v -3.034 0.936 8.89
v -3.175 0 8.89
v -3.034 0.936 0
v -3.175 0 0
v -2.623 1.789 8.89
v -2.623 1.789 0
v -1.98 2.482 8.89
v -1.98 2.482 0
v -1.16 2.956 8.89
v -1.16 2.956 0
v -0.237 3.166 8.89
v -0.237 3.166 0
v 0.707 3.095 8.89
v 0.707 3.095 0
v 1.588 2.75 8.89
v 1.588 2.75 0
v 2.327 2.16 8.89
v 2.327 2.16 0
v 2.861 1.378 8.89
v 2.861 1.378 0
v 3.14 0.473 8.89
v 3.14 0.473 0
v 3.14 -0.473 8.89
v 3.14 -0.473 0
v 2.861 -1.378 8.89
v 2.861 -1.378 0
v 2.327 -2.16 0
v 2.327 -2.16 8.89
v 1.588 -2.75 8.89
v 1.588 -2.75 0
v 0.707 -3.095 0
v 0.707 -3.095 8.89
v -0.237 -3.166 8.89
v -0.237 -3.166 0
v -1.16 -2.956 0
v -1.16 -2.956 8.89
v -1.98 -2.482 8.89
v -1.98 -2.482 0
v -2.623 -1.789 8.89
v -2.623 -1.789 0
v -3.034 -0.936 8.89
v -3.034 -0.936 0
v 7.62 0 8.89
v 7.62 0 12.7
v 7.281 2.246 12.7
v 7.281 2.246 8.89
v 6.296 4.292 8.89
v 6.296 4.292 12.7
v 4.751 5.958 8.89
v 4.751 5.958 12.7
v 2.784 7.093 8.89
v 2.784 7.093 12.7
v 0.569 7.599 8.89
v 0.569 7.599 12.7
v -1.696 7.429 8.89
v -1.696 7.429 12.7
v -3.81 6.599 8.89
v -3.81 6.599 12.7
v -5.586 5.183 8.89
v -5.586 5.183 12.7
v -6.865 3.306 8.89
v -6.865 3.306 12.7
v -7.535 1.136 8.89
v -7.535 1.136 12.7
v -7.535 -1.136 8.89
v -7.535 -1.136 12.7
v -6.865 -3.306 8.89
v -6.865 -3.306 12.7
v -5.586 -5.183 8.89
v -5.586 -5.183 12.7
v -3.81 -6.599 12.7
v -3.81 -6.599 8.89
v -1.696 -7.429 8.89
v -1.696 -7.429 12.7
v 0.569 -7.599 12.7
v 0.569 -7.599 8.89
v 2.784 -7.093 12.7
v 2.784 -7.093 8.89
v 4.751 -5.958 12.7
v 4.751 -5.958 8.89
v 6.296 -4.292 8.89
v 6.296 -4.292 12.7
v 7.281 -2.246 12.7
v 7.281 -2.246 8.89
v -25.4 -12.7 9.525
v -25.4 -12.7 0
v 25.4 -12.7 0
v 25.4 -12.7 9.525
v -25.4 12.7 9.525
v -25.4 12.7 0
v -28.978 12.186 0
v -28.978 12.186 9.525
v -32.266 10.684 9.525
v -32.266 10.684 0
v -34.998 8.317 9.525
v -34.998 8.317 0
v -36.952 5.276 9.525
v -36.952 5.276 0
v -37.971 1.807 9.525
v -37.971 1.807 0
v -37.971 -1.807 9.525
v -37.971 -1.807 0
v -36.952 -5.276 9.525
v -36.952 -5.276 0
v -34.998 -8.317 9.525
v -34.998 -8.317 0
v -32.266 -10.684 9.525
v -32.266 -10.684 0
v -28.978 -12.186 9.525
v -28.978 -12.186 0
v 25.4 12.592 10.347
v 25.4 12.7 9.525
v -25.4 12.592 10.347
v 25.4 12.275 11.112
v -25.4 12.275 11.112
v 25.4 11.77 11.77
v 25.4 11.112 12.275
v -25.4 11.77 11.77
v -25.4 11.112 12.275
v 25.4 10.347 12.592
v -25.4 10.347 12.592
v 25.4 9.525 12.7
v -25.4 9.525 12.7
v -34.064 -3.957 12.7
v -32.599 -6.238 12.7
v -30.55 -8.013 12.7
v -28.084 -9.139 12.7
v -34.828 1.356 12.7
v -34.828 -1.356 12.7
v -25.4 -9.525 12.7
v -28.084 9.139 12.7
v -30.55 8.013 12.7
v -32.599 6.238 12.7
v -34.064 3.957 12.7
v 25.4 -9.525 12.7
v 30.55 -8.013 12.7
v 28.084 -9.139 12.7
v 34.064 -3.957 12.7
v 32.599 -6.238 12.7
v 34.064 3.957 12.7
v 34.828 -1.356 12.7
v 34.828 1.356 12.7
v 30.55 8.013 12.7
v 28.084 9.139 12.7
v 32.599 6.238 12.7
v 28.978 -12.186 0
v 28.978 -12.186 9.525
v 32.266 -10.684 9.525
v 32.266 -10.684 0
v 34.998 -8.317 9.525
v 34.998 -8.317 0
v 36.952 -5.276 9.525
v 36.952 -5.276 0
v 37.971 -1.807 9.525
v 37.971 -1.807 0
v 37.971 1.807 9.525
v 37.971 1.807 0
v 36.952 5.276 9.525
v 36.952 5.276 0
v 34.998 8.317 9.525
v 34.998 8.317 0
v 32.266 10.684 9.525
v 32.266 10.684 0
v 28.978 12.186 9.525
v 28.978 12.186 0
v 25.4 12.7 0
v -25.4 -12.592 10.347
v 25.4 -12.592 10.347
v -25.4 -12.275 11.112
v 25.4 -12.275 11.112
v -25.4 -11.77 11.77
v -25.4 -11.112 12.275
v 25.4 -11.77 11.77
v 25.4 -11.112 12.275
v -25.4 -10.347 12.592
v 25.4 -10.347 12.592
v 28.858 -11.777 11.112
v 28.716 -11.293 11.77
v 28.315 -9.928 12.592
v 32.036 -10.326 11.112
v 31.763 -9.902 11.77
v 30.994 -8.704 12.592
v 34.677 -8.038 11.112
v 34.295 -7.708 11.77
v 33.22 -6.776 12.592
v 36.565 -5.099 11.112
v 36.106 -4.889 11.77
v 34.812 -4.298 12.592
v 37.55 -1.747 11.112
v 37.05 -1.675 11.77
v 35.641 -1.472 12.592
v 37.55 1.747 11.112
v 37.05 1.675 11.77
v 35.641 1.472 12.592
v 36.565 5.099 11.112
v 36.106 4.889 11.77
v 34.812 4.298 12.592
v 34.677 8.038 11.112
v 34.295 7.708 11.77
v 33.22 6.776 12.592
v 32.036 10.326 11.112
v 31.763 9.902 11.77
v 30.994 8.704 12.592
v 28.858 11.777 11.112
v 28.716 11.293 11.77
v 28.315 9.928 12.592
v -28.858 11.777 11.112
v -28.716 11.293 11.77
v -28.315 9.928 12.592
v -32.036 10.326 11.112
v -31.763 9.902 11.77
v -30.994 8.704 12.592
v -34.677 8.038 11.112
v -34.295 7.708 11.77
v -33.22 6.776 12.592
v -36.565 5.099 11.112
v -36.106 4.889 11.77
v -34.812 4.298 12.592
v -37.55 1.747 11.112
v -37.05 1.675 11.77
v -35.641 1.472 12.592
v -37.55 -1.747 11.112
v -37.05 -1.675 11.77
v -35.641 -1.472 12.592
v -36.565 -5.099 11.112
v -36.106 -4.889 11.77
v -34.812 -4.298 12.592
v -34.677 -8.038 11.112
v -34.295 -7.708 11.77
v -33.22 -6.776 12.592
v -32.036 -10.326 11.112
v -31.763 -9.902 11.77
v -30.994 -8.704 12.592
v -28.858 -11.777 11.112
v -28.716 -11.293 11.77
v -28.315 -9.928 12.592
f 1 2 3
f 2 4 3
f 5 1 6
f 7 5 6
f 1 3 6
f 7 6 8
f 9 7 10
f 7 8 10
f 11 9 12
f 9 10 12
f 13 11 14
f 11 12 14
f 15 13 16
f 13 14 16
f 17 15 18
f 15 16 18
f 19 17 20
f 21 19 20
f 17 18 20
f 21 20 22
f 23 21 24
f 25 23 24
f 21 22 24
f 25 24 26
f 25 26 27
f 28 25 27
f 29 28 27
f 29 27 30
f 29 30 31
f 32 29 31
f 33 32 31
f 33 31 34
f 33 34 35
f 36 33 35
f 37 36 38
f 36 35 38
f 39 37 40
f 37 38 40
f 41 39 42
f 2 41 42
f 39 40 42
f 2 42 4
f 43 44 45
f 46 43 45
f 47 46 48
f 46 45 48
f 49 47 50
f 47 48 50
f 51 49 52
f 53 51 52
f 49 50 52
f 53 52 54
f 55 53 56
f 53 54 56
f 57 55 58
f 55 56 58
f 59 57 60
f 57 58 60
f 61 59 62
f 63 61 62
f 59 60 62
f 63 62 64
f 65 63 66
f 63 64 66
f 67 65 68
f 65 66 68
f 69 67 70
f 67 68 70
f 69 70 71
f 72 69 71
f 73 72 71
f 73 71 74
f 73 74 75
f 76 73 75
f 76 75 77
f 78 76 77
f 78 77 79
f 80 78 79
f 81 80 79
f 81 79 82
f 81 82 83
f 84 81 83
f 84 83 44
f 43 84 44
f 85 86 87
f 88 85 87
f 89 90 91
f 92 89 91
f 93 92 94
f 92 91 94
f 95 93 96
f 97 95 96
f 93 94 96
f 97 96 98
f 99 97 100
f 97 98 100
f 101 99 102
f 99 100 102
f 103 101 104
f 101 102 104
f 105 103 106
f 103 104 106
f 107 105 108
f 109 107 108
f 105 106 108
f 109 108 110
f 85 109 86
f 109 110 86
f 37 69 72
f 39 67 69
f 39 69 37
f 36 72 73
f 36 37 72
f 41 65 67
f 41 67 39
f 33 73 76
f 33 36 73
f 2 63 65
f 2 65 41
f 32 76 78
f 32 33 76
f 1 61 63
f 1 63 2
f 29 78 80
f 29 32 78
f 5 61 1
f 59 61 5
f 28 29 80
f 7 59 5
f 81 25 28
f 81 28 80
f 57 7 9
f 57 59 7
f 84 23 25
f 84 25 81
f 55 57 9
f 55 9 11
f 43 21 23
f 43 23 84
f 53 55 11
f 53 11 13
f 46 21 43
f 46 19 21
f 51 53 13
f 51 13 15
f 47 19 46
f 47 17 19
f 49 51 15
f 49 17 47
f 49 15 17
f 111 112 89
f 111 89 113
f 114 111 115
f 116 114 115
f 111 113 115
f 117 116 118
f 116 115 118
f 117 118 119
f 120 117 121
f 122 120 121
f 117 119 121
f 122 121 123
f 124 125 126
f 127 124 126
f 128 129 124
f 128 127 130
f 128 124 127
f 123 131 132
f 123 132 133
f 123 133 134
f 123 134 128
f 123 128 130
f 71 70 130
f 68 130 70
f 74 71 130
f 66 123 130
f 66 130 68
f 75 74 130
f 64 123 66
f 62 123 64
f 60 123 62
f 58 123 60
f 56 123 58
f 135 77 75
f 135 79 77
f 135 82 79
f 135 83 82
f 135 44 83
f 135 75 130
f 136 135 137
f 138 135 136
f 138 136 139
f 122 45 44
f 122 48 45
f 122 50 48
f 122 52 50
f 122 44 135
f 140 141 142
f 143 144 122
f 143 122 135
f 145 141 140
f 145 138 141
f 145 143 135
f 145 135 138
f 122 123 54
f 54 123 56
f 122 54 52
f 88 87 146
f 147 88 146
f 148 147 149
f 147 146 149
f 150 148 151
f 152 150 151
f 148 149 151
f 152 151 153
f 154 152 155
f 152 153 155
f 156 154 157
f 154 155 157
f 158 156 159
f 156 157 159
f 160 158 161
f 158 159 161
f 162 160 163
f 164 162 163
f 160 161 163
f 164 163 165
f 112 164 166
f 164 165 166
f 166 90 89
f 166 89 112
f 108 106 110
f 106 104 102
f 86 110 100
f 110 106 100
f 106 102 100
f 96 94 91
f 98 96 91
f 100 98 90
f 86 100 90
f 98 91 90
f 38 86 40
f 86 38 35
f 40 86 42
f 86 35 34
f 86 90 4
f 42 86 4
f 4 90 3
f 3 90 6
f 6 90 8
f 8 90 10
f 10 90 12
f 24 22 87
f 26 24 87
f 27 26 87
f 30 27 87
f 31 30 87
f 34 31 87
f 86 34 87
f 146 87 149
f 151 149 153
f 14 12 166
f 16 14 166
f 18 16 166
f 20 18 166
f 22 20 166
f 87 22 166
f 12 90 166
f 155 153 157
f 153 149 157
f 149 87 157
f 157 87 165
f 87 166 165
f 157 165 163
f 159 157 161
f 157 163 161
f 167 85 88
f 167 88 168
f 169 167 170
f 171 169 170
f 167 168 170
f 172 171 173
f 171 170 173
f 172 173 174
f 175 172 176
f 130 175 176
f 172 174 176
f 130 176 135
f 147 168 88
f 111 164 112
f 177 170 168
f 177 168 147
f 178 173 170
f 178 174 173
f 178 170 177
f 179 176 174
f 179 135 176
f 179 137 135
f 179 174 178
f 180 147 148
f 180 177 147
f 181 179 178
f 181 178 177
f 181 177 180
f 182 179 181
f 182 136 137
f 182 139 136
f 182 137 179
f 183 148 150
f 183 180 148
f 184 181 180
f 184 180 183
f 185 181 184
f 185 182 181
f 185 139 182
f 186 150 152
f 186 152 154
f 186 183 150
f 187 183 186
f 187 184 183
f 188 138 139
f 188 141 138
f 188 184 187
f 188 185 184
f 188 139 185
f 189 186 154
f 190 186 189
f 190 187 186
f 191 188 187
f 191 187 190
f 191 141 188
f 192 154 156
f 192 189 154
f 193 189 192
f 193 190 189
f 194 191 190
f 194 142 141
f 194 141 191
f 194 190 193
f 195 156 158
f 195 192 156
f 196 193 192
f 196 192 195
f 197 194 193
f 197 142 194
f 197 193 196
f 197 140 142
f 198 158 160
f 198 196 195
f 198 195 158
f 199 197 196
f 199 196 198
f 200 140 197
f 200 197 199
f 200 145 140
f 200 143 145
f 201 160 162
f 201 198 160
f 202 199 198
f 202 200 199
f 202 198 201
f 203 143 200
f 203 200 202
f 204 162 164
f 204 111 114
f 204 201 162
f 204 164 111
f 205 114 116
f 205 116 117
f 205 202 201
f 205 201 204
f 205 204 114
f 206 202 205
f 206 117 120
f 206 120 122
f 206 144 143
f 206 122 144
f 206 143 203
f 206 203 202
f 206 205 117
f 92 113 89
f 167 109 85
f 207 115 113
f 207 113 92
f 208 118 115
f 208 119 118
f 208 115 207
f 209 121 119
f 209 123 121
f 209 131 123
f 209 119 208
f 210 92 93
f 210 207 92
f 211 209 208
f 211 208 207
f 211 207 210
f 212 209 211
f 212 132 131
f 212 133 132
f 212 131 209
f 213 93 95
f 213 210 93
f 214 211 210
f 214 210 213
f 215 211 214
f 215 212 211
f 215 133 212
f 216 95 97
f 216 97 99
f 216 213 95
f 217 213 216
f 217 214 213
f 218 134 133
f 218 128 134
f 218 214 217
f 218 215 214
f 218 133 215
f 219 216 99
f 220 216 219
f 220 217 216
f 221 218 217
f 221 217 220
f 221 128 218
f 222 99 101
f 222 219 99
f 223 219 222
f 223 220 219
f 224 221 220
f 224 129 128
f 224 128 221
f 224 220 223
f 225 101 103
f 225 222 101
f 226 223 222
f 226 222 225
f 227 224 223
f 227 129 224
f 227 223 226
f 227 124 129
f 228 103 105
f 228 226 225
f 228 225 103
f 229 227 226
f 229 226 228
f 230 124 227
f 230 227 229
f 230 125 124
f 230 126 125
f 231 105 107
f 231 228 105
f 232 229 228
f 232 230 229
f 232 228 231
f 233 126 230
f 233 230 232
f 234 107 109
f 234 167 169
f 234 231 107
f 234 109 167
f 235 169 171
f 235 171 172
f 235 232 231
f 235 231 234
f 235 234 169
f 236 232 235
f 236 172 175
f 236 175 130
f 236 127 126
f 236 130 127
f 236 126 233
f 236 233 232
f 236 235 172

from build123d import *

# Parameters (mm, degrees)
F0_W           = 50.8
F0_H           = 25.4
F1_DEPTH       = 12.7
F3_D           = 6.35
F3_CBORE_D     = 15.24
F3_CBORE_DEPTH = 3.81
F4_R           = 3.175


with BuildPart() as f1:
    # F0 (on Top) → F1 (new body)
    with BuildSketch(Plane.XY):
        Rectangle(F0_W, F0_H)
        with BuildLine():
            Line((-25.4, -12.7), (-25.4, 12.7))
            ThreePointArc((-25.4, 12.7), (-38.1, 0), (-25.4, -12.7))
        make_face()
        with BuildLine():
            ThreePointArc((25.4, -12.7), (38.1, 0), (25.4, 12.7))
            Line((25.4, 12.7), (25.4, -12.7))
        make_face()
    extrude(amount=F1_DEPTH)

    # F3 (through all)
    with Locations(Plane.XY.offset(12.7)):
        with Locations((0, 0)):
            CounterBoreHole(F3_D / 2, F3_CBORE_D / 2, F3_CBORE_DEPTH)

    # F4
    f4_edges = [f1.edges().sort_by_distance(p)[0] for p in [
        (-38.1, 0, 12.7),
    ]]
    fillet(f4_edges, radius=F4_R)


solid = f1.part
